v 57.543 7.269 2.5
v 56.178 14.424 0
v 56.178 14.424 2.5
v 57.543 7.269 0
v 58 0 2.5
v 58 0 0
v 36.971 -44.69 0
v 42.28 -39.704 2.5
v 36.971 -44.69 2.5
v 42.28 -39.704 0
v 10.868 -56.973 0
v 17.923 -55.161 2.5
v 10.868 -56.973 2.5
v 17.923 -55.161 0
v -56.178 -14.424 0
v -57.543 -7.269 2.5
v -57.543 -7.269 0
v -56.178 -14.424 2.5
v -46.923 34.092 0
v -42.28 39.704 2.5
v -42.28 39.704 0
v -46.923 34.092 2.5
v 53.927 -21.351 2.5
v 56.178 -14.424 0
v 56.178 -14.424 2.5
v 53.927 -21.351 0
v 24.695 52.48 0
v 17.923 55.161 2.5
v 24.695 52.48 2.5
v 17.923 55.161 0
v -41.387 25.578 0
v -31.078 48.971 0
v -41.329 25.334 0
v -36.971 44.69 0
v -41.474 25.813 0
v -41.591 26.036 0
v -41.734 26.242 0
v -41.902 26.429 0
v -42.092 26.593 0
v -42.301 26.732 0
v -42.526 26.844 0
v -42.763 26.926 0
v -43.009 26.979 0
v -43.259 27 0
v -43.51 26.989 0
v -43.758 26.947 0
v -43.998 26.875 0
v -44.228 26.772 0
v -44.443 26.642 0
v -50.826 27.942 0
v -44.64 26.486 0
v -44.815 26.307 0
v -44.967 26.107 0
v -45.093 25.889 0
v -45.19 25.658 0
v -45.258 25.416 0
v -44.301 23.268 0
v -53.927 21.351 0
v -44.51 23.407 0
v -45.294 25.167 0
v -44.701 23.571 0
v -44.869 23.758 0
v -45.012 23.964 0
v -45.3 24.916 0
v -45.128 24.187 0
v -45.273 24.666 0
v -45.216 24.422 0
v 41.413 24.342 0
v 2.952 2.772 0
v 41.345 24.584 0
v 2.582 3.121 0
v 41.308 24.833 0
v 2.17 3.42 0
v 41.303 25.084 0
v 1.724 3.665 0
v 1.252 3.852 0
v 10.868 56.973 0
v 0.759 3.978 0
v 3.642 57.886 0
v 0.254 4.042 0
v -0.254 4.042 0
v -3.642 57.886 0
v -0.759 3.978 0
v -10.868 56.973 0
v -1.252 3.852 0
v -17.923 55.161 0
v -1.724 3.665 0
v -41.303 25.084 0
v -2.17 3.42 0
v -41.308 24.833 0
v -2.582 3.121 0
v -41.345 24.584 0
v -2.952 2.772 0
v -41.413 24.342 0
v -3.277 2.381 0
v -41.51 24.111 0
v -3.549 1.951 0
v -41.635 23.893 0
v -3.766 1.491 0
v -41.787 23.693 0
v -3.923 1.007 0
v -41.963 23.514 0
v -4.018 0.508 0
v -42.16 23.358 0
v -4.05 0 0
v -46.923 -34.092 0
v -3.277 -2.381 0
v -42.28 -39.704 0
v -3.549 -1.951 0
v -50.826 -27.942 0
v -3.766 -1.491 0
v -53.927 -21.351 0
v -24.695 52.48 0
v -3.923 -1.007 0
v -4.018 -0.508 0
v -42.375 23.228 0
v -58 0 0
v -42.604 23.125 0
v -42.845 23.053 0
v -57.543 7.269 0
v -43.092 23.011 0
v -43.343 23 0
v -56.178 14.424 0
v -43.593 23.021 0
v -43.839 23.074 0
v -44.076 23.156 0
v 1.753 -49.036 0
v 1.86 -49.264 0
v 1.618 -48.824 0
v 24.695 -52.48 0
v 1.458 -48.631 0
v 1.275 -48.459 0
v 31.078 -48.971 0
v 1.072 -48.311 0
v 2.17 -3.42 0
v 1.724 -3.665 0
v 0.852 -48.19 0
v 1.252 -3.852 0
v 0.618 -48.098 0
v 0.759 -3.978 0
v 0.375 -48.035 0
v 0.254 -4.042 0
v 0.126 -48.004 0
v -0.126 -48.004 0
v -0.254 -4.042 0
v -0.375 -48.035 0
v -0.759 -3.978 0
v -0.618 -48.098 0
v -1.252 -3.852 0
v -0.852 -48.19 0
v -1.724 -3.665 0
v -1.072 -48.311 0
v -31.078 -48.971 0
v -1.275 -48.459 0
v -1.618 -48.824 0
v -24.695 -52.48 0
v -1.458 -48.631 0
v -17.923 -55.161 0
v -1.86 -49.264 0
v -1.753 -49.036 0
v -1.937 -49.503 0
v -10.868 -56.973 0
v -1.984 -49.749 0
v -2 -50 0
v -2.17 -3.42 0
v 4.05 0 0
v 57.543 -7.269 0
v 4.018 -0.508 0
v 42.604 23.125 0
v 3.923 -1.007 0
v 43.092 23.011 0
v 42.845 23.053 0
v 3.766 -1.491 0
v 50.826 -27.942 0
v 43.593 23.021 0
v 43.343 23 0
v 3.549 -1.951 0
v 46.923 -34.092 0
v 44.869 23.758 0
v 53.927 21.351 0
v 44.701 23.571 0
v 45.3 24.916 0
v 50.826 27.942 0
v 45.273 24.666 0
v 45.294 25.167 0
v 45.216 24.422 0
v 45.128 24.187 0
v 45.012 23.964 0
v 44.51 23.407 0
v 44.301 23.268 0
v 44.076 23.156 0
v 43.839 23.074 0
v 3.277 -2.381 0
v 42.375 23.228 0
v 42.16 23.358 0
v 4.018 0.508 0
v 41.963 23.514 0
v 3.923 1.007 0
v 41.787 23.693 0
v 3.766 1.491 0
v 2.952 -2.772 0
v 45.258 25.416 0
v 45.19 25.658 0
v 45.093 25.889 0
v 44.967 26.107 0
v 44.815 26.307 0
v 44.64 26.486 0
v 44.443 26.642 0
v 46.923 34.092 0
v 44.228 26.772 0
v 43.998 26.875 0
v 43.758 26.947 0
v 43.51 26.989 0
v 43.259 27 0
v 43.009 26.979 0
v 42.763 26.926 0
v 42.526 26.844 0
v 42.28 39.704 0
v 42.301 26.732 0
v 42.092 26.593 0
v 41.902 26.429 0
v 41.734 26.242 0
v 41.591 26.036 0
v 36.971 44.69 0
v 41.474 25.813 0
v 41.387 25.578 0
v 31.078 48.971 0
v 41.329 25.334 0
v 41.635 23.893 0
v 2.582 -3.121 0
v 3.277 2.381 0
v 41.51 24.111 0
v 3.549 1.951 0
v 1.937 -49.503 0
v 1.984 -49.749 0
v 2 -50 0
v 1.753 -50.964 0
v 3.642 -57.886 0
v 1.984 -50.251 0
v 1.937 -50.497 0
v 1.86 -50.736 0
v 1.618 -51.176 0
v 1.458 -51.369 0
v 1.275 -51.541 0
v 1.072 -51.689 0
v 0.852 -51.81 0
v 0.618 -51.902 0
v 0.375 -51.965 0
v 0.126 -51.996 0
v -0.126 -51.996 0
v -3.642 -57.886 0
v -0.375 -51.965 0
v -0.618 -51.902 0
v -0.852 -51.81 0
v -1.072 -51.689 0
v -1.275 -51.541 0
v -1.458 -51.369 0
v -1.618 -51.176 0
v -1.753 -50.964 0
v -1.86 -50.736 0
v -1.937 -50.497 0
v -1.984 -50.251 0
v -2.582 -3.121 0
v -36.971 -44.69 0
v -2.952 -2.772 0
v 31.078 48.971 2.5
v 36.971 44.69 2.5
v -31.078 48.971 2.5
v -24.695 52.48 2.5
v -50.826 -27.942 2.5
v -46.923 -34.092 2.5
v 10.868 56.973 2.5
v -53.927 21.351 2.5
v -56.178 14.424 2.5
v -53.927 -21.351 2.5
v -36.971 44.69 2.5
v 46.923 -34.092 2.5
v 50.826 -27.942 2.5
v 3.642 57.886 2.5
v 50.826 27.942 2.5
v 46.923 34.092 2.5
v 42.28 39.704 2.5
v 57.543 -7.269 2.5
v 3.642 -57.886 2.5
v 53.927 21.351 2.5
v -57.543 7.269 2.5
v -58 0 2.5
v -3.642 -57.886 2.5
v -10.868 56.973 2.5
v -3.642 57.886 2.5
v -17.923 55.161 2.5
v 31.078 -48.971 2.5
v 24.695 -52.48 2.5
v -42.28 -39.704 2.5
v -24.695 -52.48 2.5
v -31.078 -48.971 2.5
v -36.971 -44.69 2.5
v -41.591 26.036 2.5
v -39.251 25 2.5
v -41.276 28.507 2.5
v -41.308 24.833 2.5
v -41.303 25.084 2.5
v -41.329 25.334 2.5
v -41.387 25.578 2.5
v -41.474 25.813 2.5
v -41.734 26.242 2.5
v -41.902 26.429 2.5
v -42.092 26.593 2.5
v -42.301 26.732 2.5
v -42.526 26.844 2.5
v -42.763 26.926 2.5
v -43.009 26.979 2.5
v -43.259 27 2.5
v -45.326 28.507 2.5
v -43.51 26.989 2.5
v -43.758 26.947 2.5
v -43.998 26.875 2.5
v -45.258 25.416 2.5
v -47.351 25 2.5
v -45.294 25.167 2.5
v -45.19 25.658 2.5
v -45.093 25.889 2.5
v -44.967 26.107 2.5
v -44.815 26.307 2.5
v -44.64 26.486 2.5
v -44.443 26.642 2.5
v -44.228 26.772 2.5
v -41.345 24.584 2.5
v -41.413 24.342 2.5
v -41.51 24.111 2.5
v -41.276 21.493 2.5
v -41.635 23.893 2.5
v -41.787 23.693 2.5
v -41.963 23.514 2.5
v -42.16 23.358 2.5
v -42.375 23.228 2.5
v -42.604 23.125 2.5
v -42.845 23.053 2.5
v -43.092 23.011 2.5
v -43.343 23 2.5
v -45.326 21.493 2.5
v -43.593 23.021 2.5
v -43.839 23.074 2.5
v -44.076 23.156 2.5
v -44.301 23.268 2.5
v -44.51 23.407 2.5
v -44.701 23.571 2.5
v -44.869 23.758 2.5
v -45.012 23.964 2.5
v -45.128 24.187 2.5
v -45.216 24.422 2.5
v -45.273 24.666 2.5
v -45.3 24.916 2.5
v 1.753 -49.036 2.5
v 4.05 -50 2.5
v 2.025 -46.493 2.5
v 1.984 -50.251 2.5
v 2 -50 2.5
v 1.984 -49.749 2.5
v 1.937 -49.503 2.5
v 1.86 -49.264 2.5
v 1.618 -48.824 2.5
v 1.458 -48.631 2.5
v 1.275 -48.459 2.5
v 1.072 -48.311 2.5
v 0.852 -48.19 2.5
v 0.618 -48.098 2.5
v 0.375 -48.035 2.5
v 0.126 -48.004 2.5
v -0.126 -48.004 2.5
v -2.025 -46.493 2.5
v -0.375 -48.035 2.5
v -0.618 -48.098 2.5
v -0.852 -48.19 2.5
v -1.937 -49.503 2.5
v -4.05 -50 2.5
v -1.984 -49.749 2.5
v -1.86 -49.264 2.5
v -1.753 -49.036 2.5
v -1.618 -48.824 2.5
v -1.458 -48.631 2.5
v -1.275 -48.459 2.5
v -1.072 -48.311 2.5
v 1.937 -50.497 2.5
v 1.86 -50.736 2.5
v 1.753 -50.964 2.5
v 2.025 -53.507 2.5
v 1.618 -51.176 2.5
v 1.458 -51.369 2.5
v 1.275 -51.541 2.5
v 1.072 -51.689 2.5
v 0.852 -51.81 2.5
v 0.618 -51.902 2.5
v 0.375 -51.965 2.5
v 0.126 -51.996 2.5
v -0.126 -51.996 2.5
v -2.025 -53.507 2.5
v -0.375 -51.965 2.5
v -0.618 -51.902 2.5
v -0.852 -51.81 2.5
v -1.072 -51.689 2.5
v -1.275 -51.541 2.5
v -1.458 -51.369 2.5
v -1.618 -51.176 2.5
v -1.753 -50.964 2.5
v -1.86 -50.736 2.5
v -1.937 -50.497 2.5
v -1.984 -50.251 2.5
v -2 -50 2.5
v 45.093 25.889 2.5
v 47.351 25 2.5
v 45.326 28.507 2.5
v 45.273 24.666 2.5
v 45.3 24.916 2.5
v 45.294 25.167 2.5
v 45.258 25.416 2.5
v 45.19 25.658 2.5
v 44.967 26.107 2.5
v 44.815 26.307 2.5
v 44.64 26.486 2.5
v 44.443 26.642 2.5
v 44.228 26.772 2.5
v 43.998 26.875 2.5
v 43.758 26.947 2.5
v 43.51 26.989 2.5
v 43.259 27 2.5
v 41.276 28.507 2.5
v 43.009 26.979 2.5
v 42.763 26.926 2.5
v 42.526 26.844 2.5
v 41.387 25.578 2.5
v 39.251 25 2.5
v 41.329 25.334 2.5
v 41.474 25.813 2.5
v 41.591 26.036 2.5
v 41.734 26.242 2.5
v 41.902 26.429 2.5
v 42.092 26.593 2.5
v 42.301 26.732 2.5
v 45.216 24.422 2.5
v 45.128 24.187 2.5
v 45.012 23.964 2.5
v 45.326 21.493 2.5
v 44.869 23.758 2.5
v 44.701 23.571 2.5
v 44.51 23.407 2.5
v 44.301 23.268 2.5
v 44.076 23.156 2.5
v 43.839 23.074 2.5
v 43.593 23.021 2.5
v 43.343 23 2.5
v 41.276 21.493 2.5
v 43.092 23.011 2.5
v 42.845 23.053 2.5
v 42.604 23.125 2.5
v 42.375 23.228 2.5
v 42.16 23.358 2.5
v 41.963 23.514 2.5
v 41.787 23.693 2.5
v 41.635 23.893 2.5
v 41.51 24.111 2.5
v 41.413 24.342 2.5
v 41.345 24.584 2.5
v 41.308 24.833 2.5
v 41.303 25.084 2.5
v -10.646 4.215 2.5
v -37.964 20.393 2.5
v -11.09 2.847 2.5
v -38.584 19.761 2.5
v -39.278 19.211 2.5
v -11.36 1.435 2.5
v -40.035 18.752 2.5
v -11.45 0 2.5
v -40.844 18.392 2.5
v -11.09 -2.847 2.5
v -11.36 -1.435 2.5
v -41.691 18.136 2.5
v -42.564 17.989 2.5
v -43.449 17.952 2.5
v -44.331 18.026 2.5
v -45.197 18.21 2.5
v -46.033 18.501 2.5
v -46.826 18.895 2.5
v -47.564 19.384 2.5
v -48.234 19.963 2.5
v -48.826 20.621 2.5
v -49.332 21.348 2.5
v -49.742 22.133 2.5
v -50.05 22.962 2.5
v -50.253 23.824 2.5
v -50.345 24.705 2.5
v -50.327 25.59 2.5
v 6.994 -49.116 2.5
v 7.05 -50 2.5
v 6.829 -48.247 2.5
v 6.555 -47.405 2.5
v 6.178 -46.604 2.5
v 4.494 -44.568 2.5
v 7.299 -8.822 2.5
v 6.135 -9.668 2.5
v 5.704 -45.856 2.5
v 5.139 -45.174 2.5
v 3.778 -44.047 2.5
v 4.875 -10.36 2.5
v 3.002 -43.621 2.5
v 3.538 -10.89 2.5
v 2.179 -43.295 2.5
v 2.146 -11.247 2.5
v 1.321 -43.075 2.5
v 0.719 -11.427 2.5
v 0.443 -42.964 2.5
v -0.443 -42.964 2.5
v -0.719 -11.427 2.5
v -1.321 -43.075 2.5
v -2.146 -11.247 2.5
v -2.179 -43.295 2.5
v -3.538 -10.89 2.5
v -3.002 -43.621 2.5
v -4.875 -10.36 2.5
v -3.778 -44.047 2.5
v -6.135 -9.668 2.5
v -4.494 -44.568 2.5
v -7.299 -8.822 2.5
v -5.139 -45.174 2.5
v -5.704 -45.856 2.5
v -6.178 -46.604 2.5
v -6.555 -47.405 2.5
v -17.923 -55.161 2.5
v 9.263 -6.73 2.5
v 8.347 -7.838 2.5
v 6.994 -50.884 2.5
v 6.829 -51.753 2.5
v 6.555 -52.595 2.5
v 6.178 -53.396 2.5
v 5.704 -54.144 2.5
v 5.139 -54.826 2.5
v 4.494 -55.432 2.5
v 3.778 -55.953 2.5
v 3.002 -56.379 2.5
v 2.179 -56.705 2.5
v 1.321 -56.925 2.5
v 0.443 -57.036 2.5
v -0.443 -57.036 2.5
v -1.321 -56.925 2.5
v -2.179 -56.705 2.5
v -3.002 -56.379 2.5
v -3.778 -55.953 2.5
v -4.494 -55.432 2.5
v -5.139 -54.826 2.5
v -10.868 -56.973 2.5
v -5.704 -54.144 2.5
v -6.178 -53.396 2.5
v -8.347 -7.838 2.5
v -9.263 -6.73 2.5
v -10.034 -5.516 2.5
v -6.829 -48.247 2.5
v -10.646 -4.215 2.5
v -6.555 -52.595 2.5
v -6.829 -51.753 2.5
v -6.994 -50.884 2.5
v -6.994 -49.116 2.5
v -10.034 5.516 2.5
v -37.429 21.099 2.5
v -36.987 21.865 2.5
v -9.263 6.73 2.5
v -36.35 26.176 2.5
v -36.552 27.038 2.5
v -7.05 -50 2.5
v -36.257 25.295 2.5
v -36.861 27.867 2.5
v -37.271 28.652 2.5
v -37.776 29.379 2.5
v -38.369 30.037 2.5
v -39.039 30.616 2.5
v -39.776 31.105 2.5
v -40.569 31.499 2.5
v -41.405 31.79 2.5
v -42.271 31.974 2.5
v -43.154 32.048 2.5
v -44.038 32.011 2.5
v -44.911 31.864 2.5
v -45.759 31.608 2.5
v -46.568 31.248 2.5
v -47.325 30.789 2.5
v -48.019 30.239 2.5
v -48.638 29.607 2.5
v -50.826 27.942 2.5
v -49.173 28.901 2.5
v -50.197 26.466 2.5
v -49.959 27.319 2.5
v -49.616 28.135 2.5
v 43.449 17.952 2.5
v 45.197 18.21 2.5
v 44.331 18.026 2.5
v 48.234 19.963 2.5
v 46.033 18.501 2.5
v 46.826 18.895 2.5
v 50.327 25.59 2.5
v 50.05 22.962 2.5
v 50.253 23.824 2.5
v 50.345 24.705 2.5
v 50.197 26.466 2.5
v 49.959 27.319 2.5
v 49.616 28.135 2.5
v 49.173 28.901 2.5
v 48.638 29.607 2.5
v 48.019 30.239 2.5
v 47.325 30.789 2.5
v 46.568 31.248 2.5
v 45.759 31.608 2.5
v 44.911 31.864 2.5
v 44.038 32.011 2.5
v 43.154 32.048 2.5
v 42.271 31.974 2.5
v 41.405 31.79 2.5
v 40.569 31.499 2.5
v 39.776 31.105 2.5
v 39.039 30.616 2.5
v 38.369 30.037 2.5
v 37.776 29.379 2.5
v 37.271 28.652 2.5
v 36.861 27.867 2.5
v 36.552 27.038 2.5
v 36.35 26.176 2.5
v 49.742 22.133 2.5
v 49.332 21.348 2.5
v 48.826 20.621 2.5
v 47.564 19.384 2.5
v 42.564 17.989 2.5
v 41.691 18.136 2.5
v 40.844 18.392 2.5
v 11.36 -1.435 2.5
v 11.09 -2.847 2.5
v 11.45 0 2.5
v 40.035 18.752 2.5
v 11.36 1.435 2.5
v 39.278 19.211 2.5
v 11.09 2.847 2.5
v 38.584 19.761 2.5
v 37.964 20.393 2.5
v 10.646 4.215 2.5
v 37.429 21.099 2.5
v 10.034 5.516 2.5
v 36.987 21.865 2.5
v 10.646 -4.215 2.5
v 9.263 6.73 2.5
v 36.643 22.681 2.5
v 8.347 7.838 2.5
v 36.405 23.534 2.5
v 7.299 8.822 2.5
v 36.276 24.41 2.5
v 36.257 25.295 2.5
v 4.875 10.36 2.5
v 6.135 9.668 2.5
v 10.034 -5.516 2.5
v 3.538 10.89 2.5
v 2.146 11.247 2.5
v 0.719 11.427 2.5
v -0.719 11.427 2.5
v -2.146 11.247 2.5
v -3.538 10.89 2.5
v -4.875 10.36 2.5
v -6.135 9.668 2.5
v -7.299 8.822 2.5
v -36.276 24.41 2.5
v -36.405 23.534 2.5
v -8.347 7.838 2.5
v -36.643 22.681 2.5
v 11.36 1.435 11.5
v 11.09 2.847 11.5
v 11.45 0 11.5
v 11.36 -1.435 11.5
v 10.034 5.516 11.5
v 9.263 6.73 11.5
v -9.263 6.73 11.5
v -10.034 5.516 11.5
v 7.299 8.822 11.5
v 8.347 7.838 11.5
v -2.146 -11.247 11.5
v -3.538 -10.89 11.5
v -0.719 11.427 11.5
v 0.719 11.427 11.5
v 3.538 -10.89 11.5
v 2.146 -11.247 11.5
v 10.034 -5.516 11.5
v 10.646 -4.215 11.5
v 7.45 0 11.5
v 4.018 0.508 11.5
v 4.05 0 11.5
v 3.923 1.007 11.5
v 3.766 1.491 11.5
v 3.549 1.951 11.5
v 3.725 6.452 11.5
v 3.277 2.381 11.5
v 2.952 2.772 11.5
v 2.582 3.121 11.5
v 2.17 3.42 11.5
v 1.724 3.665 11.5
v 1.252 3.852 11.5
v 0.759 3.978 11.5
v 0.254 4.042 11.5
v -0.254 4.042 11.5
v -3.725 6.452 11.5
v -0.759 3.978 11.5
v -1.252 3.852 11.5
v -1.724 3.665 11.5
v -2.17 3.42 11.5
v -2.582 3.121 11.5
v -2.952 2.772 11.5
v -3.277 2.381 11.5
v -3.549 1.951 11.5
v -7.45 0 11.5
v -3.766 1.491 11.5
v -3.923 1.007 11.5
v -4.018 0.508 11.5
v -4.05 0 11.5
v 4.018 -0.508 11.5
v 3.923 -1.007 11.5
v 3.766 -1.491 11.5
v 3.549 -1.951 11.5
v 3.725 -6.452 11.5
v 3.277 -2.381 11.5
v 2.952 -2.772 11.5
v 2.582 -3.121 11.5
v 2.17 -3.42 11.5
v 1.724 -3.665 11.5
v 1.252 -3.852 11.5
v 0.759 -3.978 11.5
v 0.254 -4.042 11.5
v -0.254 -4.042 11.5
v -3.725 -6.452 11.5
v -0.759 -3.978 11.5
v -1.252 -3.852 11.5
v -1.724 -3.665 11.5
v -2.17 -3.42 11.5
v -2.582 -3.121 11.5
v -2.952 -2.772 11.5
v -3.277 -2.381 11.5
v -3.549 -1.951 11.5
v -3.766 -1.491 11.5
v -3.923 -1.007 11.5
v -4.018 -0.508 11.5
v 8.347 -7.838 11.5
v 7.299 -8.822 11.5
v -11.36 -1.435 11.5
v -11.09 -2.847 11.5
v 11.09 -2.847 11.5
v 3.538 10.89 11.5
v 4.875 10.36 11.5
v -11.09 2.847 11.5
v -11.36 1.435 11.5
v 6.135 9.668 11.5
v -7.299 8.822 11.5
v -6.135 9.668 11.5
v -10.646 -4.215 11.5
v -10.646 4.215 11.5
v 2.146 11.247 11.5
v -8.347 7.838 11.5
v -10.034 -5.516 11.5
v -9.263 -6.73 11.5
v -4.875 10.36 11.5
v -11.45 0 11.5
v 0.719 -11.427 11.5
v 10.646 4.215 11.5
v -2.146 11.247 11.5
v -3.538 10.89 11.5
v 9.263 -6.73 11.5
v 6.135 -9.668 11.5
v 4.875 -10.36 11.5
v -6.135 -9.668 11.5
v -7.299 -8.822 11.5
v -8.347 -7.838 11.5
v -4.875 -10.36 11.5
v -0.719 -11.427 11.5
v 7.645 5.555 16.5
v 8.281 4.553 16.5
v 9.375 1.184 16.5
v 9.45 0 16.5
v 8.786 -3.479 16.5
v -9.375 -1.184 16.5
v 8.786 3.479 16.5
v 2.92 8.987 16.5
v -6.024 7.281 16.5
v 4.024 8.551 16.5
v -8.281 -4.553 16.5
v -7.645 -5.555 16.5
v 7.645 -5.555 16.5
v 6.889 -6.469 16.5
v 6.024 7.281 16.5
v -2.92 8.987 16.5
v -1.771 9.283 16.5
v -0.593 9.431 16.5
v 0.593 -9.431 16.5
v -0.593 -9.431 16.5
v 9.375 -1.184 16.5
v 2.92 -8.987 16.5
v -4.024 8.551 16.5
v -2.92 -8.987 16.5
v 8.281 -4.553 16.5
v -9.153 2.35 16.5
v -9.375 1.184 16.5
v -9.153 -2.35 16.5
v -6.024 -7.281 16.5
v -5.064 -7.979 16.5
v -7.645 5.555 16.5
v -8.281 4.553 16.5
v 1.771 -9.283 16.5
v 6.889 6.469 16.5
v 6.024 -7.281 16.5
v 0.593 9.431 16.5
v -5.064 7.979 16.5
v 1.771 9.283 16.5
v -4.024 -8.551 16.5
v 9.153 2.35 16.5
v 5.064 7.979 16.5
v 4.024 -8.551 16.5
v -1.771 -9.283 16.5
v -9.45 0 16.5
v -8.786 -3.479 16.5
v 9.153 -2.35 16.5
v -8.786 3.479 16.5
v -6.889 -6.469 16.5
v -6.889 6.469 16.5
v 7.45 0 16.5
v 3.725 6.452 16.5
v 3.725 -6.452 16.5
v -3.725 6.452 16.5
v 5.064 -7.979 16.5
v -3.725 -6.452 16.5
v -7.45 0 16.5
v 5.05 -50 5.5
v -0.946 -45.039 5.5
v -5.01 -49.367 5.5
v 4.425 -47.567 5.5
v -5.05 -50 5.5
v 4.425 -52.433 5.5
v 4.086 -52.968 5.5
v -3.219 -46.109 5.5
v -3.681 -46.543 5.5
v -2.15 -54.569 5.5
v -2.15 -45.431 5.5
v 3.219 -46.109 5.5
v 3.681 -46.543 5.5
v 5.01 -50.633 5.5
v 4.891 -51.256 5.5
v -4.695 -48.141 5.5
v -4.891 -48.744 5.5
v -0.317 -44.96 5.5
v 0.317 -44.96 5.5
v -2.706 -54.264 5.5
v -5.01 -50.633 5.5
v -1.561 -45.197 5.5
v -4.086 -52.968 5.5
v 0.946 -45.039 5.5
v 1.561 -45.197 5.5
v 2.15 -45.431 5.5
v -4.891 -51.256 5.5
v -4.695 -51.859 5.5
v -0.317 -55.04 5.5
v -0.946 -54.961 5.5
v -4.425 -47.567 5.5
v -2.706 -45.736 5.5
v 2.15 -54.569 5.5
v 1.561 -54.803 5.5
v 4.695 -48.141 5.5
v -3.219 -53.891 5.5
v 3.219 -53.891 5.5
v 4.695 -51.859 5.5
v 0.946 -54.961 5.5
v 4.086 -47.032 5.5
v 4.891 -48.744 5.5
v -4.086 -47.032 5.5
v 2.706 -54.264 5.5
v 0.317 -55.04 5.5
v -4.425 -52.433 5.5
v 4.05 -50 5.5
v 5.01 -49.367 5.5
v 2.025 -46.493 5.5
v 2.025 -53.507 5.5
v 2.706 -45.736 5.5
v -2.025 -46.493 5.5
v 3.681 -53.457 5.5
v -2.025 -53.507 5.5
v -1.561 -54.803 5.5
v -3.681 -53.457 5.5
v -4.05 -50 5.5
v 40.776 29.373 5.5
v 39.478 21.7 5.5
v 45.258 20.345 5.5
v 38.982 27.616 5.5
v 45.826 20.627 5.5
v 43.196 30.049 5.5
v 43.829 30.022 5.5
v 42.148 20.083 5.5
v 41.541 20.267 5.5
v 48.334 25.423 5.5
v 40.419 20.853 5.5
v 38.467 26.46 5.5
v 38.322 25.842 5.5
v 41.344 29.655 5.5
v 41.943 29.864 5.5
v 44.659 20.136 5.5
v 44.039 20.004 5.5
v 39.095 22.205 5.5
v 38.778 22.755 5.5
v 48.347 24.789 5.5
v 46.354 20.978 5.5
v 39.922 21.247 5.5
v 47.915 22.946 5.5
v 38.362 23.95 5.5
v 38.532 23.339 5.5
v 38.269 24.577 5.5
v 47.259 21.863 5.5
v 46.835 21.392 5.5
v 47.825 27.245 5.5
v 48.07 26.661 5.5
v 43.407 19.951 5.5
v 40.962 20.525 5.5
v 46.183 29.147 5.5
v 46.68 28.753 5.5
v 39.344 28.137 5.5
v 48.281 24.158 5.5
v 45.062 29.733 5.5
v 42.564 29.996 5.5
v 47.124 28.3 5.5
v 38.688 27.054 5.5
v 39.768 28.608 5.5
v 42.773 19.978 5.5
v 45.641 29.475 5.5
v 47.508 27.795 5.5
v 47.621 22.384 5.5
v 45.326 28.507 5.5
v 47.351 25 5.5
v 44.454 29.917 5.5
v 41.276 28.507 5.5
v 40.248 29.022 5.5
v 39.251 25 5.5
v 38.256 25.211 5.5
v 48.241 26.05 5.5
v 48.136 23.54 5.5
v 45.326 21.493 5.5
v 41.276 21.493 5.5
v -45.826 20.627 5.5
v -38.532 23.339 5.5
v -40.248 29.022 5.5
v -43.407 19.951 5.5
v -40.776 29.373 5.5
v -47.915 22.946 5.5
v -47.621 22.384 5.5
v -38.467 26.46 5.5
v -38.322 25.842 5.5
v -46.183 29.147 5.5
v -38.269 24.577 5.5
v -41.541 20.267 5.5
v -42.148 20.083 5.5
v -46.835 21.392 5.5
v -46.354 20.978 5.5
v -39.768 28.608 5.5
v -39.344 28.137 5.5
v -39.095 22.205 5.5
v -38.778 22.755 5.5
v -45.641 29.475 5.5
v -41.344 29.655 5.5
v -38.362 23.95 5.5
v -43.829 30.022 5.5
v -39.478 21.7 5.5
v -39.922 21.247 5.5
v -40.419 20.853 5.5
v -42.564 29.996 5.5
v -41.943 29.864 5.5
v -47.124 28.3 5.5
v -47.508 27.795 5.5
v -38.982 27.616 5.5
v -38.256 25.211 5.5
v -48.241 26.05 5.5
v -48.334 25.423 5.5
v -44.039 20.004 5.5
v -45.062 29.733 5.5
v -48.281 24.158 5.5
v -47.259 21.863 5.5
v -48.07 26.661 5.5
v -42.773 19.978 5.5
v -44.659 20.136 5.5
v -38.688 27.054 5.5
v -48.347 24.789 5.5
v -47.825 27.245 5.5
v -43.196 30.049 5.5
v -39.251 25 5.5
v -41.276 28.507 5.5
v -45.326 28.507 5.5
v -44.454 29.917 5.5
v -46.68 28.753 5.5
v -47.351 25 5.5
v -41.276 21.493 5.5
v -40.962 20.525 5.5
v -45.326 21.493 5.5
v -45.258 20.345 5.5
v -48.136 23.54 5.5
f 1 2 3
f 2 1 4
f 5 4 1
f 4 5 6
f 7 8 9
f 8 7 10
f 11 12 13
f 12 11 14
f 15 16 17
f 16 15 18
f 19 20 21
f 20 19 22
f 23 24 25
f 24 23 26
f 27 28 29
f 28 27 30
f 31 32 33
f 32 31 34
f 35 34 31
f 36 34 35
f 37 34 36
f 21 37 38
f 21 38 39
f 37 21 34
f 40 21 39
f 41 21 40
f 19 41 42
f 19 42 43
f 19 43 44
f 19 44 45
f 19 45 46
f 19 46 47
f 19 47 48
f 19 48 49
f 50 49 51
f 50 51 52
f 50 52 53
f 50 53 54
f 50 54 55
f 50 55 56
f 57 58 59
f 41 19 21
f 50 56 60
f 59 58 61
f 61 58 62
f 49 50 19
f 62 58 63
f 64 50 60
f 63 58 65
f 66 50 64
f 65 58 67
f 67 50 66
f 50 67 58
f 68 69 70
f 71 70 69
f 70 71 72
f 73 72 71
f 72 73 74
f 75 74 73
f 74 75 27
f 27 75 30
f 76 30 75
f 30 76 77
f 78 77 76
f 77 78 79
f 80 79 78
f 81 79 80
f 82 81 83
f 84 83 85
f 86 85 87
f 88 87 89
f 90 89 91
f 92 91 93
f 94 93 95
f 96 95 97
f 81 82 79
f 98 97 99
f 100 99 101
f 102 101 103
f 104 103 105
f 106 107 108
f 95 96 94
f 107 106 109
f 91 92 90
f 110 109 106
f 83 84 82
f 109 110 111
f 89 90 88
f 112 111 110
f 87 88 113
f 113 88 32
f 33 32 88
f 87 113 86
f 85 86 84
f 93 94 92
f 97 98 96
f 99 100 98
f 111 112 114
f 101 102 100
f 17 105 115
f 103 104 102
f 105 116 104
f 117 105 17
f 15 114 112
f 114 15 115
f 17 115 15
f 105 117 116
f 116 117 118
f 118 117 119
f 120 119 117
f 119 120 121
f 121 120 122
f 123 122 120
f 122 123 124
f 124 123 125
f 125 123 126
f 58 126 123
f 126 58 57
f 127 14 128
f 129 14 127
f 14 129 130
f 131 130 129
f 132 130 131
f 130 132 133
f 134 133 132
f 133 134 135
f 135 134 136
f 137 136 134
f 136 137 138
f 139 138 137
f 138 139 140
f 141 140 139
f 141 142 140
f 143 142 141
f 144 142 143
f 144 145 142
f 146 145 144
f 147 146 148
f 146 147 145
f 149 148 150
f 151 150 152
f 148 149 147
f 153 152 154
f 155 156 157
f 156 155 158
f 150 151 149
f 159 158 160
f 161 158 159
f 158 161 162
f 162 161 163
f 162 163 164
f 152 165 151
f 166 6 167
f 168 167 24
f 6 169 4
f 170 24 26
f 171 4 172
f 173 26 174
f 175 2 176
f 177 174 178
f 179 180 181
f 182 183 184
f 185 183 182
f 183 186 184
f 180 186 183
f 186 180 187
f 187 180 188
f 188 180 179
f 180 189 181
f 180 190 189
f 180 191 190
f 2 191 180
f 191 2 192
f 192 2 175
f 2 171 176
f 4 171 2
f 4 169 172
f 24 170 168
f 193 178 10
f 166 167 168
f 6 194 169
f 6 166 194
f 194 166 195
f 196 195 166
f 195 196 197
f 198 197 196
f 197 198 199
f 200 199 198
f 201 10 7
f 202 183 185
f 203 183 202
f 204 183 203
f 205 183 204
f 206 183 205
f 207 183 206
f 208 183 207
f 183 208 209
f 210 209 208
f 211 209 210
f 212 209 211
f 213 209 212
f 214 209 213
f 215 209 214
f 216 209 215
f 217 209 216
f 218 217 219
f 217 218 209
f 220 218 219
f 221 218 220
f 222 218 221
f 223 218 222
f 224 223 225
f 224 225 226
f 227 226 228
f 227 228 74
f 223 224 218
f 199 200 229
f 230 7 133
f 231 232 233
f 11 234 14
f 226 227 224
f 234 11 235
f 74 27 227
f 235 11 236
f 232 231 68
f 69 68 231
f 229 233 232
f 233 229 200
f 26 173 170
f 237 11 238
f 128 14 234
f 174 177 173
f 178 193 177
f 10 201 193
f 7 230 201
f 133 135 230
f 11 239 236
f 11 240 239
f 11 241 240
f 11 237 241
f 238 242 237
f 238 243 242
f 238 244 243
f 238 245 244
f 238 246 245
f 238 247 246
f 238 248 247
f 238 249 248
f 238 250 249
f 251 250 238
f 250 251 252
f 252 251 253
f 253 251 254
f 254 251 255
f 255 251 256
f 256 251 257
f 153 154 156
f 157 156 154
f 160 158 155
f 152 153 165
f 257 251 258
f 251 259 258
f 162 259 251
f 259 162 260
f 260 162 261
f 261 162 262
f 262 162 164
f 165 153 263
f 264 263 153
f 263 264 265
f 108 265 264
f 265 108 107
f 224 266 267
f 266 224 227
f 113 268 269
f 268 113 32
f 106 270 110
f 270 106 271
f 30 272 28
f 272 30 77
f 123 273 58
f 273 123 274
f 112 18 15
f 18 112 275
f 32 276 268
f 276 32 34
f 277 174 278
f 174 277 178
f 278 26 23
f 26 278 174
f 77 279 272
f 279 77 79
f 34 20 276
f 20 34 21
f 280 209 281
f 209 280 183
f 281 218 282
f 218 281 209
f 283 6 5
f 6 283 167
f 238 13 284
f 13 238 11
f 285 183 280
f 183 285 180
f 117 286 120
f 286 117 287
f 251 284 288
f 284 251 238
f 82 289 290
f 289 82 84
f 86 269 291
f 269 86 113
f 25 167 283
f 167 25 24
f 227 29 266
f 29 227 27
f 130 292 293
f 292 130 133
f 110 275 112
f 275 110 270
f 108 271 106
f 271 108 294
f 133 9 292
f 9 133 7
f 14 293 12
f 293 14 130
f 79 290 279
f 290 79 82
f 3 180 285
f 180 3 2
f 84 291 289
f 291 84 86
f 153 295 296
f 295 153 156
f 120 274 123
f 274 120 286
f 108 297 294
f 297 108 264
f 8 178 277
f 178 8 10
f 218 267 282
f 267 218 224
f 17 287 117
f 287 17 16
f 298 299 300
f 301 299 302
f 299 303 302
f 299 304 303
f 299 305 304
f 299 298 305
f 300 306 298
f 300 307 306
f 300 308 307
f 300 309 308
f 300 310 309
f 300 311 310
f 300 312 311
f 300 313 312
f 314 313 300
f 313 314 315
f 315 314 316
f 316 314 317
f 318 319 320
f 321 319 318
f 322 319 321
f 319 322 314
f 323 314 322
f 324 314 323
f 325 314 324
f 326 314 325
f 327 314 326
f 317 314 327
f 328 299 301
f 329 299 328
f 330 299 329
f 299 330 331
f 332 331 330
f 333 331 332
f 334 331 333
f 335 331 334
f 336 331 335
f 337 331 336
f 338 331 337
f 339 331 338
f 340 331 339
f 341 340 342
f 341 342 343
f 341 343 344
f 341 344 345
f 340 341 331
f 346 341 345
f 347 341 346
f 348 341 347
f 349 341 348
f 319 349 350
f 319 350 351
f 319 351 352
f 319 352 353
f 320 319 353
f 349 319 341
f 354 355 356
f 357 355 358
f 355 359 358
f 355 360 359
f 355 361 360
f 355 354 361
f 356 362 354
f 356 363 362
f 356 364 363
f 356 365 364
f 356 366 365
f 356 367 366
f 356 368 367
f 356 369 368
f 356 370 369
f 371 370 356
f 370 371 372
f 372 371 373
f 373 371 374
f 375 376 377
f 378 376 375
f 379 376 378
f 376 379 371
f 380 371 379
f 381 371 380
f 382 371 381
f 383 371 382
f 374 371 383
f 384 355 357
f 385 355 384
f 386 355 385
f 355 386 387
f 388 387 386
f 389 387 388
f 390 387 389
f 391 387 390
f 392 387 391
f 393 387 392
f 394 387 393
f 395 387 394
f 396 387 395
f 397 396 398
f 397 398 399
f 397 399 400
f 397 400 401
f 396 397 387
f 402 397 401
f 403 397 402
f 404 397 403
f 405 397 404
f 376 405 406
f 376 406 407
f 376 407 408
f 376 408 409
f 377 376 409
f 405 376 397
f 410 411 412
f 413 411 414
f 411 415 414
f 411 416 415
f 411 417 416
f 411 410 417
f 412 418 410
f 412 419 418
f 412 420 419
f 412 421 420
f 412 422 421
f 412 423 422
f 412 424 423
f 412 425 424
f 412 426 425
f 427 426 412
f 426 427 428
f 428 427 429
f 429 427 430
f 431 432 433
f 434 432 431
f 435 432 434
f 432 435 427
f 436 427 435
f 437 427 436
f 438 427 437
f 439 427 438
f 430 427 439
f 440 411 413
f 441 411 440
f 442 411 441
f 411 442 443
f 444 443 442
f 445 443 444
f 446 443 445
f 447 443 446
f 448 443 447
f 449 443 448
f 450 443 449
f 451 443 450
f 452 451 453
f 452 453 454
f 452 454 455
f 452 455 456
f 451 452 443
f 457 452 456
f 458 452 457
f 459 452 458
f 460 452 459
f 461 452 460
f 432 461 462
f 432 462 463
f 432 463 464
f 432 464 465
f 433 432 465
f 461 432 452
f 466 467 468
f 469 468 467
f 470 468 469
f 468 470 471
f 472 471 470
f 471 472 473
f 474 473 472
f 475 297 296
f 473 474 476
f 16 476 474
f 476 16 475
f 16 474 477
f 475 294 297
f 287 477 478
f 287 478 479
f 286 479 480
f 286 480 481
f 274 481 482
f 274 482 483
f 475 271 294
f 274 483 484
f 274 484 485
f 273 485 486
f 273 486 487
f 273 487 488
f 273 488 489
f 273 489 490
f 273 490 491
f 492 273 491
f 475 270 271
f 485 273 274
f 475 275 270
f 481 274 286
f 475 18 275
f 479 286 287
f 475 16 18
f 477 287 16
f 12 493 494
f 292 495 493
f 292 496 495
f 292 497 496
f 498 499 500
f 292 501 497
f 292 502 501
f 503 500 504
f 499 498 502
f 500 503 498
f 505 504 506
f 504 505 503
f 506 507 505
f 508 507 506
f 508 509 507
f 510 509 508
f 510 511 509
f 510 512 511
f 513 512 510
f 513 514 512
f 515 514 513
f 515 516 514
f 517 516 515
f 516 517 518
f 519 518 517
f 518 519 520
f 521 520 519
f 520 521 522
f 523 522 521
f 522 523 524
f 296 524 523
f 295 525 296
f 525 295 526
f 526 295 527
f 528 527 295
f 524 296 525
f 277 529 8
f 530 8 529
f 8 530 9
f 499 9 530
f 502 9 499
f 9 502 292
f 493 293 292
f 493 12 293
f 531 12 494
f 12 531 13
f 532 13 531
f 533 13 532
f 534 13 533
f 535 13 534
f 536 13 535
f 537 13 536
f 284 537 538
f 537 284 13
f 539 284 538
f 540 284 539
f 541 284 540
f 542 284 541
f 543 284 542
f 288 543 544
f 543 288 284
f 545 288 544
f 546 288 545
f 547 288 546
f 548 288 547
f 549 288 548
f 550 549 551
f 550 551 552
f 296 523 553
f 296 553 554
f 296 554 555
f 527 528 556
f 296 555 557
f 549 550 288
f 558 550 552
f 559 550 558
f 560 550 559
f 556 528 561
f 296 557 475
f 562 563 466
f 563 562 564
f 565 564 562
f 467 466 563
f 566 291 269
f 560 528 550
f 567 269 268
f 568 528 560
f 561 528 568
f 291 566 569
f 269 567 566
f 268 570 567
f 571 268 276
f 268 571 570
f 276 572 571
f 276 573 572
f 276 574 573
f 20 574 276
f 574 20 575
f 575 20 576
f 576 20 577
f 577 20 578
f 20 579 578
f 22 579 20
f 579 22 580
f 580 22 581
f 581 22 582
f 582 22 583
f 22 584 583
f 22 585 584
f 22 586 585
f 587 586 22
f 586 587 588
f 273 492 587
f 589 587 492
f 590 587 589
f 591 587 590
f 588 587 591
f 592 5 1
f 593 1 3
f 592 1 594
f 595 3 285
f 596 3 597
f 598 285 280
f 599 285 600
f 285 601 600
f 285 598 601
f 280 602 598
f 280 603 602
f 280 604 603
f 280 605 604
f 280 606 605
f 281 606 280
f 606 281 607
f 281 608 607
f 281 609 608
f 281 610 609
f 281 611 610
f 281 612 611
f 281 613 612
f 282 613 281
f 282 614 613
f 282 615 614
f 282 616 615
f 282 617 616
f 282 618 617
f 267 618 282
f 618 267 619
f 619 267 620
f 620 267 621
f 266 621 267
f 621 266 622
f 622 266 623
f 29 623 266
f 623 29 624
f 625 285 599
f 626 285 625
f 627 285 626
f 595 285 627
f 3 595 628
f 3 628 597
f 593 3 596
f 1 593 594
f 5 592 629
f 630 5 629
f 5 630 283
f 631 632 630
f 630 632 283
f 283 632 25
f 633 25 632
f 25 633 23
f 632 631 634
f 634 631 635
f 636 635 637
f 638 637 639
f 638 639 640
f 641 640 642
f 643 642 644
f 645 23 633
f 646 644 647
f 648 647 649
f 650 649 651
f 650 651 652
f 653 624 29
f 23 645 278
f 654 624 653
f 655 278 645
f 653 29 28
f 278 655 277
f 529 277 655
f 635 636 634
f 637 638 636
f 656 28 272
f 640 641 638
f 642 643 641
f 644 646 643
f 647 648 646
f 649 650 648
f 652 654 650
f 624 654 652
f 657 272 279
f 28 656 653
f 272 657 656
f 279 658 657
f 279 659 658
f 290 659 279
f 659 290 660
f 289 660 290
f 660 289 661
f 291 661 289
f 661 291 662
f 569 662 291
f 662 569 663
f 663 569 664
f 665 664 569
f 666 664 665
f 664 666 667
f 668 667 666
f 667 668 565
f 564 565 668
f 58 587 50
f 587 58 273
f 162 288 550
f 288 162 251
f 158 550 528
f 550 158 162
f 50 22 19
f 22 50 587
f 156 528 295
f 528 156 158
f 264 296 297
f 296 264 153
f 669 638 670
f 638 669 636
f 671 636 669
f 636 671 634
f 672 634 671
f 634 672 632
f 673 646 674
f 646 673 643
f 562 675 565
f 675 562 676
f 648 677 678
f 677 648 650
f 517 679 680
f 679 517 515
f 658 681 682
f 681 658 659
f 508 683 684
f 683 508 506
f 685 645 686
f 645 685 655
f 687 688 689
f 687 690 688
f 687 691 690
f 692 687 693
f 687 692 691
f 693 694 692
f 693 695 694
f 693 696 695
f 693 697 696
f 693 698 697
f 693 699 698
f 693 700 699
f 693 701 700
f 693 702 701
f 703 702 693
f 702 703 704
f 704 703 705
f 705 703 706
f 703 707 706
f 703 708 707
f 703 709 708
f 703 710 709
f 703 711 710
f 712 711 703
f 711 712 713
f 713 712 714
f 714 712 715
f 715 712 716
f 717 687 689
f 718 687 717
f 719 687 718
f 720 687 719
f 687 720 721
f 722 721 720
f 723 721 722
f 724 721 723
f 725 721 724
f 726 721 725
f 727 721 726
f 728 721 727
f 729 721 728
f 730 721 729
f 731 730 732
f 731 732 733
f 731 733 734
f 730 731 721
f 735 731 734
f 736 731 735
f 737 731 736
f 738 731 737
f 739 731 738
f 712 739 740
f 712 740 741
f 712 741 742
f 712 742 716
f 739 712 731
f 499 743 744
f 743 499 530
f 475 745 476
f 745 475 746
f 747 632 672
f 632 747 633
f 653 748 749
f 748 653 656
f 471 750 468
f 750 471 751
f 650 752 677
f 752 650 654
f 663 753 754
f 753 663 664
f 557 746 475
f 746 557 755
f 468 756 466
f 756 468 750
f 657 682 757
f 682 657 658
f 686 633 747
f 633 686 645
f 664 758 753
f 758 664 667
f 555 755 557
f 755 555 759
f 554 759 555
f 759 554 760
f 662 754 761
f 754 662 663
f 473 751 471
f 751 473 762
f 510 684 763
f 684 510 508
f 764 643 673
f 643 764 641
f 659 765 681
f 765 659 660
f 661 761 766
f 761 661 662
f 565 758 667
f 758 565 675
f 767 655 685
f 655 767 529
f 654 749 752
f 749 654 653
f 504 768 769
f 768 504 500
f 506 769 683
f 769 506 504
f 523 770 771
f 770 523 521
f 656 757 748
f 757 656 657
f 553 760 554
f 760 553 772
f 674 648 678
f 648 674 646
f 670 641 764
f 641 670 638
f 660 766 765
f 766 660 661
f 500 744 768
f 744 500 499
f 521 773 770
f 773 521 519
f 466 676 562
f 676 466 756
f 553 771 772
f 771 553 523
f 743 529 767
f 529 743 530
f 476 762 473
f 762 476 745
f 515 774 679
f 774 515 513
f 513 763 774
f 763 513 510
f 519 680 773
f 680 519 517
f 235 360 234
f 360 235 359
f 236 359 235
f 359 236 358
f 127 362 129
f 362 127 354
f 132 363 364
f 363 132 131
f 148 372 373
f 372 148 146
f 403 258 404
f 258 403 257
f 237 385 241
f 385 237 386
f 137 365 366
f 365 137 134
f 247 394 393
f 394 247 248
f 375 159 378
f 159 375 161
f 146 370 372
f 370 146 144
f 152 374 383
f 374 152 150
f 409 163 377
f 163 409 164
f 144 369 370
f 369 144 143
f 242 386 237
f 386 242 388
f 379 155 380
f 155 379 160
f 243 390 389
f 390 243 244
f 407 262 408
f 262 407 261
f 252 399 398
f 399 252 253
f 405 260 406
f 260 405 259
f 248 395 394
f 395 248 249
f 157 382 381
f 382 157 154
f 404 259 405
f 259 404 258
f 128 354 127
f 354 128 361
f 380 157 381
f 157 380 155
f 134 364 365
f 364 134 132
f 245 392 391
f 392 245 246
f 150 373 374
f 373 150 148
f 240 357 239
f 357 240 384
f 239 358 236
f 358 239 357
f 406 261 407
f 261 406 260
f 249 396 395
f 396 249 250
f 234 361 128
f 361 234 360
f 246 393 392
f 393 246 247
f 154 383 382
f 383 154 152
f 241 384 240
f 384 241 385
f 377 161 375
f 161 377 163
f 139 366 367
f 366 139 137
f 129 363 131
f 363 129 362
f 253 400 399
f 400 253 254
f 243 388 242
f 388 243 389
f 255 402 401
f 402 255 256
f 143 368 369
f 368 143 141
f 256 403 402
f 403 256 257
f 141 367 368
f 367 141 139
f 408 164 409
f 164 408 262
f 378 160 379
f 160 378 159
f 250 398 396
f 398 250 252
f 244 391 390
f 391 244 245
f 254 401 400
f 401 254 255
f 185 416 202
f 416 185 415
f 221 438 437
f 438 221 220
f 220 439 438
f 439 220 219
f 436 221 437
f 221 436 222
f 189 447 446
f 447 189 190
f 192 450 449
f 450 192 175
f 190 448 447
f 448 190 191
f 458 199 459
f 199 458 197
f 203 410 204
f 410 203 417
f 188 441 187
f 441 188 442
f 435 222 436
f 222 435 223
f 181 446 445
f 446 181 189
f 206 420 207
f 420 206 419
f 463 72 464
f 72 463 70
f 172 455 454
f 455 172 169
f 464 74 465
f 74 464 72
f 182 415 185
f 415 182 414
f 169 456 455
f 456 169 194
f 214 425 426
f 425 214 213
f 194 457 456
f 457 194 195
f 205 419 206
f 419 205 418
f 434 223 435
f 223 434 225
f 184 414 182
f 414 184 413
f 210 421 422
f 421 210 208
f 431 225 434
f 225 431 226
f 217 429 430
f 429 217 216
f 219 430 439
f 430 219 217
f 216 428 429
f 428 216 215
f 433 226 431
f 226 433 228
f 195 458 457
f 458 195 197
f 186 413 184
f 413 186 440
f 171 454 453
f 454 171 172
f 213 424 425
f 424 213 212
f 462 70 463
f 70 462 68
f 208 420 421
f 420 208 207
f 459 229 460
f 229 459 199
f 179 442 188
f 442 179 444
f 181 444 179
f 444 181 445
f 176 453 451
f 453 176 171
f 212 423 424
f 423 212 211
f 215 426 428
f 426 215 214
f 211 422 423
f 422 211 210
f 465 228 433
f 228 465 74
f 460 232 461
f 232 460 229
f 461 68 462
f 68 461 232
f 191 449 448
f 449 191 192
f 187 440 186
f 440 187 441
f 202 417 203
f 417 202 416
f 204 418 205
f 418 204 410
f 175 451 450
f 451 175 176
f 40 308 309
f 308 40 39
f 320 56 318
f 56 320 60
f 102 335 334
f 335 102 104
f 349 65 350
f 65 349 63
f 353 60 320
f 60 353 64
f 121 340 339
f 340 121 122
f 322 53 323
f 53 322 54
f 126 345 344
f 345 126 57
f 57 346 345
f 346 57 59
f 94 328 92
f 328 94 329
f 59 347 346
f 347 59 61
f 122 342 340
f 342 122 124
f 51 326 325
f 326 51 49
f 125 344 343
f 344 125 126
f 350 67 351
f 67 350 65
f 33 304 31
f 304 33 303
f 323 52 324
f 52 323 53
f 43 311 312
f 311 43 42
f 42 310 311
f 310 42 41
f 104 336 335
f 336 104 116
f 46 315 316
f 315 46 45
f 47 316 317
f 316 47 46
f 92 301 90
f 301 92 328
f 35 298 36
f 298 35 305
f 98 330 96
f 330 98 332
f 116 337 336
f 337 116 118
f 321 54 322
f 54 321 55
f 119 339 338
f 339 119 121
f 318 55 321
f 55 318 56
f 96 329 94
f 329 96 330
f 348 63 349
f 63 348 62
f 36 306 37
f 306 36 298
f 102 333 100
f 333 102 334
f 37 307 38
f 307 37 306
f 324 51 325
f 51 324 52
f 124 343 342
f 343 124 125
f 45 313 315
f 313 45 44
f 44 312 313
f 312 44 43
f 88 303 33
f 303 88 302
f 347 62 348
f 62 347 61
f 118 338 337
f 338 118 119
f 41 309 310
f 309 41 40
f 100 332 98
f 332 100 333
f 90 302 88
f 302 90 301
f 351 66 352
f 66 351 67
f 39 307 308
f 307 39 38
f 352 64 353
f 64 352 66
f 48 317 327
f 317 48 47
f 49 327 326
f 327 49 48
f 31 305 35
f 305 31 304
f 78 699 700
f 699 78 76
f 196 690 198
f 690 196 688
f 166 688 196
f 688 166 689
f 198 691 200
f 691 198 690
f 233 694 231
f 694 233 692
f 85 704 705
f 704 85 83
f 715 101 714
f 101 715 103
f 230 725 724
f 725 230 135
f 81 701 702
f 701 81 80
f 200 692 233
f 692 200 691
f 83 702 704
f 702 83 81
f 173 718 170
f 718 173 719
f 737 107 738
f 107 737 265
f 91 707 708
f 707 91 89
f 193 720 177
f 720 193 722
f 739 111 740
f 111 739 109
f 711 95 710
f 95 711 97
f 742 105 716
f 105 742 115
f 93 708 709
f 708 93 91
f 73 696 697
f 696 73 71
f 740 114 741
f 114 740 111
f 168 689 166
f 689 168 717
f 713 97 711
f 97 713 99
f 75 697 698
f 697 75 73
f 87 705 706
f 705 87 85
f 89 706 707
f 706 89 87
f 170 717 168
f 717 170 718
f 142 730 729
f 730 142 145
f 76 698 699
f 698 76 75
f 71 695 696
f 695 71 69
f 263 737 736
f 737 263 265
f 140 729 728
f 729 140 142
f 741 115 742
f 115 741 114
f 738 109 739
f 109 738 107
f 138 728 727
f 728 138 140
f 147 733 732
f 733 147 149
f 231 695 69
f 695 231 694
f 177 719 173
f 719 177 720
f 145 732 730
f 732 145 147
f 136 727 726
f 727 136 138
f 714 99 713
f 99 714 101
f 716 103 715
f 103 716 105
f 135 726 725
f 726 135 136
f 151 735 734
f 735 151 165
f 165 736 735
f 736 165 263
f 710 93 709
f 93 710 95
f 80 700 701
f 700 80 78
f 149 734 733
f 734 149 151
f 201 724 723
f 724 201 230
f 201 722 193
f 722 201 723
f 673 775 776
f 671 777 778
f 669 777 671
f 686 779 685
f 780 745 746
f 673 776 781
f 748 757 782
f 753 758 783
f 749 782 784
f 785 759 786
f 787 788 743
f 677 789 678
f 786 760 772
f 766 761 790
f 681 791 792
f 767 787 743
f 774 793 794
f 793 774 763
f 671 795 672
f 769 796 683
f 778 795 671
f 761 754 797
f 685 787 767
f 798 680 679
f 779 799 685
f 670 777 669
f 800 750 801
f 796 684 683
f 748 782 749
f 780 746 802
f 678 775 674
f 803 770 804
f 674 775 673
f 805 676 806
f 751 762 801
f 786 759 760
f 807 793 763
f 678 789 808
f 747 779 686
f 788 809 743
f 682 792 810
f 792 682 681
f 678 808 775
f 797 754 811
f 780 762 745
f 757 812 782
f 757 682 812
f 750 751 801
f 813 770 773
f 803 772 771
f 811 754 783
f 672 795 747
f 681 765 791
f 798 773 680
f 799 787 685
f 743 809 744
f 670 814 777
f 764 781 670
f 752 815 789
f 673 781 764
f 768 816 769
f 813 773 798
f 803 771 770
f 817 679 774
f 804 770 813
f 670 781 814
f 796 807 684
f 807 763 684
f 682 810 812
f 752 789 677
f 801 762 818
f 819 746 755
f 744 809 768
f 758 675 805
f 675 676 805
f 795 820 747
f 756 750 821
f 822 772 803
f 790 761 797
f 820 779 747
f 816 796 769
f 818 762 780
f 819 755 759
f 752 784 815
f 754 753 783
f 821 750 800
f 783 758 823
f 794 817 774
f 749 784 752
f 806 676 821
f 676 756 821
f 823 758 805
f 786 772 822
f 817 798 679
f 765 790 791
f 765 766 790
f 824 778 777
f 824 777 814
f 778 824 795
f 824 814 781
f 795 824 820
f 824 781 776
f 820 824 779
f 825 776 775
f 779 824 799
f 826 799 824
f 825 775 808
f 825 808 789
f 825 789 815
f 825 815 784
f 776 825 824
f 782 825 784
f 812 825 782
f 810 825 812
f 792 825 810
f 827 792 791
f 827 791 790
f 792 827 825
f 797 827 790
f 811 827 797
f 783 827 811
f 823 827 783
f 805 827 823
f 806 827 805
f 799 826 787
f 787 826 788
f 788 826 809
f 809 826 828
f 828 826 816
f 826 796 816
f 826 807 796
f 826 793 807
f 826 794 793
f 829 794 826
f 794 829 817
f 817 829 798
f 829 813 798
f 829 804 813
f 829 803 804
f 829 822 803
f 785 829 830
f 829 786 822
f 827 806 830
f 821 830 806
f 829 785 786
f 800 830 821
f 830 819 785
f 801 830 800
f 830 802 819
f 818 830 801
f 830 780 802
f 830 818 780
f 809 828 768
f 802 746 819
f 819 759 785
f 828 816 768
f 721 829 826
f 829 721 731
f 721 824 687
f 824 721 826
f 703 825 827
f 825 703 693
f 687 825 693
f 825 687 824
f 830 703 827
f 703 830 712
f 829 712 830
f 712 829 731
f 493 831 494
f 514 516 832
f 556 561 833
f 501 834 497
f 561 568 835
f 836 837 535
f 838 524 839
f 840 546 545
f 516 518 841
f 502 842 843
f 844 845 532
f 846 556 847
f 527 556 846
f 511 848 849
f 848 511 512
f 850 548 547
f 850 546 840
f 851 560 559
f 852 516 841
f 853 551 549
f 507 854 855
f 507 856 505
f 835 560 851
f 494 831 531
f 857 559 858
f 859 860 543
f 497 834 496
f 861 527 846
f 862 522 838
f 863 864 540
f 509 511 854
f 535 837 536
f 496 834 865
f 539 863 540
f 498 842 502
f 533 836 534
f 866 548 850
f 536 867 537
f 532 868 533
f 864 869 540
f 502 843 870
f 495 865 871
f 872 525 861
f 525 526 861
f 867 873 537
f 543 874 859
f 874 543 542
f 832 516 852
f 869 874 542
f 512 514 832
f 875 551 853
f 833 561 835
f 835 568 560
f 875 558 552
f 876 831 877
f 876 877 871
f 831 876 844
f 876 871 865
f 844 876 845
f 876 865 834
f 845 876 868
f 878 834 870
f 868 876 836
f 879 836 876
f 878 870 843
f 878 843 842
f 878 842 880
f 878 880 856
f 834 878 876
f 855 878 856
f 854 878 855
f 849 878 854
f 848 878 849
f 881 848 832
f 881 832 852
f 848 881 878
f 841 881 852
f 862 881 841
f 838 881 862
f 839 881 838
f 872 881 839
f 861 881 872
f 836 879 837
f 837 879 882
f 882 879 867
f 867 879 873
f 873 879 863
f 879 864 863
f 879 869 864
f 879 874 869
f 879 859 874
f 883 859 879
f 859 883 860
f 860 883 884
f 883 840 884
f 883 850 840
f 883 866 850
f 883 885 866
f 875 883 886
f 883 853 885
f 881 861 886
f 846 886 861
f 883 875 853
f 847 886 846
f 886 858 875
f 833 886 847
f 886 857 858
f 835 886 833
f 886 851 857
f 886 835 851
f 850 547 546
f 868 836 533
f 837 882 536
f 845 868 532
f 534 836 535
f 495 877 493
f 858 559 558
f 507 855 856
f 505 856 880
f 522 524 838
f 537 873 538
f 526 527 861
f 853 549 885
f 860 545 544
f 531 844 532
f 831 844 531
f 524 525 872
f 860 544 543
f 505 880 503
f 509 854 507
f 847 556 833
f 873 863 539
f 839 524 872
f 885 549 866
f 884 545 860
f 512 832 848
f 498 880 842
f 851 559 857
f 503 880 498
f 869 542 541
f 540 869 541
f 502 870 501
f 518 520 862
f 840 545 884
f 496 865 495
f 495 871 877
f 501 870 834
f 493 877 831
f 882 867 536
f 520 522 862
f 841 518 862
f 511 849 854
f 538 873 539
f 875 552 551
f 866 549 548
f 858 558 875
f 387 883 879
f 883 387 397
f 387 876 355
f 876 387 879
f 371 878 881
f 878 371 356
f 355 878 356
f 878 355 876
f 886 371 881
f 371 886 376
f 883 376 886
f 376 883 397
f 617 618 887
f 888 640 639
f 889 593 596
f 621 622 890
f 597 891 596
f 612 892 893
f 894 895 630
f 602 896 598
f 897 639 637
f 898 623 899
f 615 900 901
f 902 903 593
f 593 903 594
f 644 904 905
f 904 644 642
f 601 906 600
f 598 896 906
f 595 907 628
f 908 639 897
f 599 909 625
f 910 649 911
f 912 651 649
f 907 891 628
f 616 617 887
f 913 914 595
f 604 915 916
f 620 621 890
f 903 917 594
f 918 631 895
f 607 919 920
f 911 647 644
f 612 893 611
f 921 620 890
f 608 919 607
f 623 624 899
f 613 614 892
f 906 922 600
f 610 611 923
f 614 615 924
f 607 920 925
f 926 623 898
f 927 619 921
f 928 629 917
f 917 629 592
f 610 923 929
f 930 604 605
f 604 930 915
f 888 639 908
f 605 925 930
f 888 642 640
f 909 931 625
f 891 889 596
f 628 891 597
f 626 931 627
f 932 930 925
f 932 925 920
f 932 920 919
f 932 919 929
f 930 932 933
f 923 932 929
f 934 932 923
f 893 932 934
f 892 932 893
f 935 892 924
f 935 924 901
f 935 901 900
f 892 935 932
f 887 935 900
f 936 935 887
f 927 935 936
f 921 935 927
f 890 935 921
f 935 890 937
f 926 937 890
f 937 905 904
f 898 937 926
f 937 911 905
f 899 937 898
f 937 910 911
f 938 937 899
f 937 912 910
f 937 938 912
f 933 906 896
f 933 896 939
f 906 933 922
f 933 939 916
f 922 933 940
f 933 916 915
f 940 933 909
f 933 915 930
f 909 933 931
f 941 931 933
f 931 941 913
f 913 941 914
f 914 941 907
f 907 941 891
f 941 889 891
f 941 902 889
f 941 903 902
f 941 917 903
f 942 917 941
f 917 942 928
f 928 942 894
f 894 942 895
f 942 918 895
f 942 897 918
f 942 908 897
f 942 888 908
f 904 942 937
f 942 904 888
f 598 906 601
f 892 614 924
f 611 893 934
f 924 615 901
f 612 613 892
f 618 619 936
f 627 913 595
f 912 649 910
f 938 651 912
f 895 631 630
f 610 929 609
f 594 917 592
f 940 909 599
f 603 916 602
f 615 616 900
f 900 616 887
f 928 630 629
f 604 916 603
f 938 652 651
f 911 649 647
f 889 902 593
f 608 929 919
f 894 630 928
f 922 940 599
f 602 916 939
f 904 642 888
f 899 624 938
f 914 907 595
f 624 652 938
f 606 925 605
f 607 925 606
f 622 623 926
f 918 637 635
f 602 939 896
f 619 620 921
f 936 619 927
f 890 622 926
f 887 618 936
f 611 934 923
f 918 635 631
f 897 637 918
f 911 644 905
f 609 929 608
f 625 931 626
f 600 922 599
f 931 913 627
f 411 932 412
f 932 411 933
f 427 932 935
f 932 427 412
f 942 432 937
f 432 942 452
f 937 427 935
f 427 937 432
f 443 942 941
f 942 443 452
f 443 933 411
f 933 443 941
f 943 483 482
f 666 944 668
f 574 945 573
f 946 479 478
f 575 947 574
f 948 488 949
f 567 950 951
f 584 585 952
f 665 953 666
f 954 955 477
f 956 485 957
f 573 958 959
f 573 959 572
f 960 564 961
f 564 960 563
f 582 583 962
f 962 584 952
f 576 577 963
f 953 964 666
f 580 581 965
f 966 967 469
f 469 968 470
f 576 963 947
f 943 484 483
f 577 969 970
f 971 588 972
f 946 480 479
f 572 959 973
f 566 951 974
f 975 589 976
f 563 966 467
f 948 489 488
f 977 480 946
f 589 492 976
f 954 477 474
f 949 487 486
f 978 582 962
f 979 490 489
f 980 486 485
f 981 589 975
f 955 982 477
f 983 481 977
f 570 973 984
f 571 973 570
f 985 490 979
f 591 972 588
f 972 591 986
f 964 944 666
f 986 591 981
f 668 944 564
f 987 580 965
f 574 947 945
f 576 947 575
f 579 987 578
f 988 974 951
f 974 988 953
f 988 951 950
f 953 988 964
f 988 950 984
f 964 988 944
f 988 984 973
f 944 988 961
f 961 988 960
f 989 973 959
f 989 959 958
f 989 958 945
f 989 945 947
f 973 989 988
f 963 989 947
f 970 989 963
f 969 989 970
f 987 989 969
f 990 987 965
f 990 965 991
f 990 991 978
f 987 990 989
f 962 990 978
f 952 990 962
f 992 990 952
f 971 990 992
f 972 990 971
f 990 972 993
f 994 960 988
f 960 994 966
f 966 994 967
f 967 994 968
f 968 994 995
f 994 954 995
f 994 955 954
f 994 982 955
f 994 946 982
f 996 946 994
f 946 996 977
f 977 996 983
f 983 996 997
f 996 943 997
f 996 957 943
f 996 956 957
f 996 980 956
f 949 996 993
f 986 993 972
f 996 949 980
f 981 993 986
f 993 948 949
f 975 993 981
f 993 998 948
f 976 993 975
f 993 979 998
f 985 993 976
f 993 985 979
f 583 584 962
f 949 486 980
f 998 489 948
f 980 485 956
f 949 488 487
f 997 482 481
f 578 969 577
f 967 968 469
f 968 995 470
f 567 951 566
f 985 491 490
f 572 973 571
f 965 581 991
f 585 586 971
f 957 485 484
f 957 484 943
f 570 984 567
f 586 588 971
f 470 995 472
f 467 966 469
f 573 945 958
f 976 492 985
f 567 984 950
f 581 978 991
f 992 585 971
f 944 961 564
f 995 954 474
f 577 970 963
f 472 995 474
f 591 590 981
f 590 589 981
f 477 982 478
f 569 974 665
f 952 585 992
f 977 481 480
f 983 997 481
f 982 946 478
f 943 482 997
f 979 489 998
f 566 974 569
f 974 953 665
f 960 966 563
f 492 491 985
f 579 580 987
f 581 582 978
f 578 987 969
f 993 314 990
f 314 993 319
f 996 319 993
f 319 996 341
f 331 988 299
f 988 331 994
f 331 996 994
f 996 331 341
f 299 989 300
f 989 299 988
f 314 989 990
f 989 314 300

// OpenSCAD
disk_thickness = 2.5;
disk_radius = 58;
centertower_height = 9;
outer_nut_count = 3;




union(){
    centernut_height = 5;
    centernutradius = 14.9 /2;
    outernutheight = 3;
    outernutradius = 8.1 / 2;
    outerstuffmargin = 8; 
    
    difference(){
        union(){
            cylinder(h = disk_thickness, r = disk_radius, center = false, $fn = 50);
            translate([0, 0, disk_thickness]) cylinder(h = centertower_height, r =centernutradius + 4, center = false, $fn = 50);
            }
        cylinder(h = disk_thickness + centertower_height, d = 8.1, center = false, $fn = 50);
     make_ring_of(disk_radius - outerstuffmargin, outer_nut_count) cylinder(h = disk_thickness, r = 2, center = false, $fn = 50);
    }

    translate([0, 0, disk_thickness + centertower_height]) difference(){
        cylinder(h = centernut_height, r1 =centernutradius + 4, r2 =centernutradius + 2, center = false, $fn = 50);
        cylinder(h = centernut_height, r = centernutradius,center = false, $fn = 6);

    }

    
    translate([0, 0, disk_thickness]) make_ring_of(disk_radius - outerstuffmargin, outer_nut_count)  difference(){
        cylinder(h = outernutheight, r1 =outernutradius + 3, r2 =outernutradius + 1, center = false, $fn = 50);
        cylinder(h = outernutheight, r = outernutradius,center = false, $fn = 6);
    }
}
//cylinder(h = plateheight, r = 40, center = false, $fn = 6);



module make_ring_of(radius, count)
{
    for (a = [0 : count - 1]) {
        angle = a * 360 / count;
        translate(radius * [sin(angle), -cos(angle), 0])
            rotate([0, 0, angle])
                children();
    }
}
